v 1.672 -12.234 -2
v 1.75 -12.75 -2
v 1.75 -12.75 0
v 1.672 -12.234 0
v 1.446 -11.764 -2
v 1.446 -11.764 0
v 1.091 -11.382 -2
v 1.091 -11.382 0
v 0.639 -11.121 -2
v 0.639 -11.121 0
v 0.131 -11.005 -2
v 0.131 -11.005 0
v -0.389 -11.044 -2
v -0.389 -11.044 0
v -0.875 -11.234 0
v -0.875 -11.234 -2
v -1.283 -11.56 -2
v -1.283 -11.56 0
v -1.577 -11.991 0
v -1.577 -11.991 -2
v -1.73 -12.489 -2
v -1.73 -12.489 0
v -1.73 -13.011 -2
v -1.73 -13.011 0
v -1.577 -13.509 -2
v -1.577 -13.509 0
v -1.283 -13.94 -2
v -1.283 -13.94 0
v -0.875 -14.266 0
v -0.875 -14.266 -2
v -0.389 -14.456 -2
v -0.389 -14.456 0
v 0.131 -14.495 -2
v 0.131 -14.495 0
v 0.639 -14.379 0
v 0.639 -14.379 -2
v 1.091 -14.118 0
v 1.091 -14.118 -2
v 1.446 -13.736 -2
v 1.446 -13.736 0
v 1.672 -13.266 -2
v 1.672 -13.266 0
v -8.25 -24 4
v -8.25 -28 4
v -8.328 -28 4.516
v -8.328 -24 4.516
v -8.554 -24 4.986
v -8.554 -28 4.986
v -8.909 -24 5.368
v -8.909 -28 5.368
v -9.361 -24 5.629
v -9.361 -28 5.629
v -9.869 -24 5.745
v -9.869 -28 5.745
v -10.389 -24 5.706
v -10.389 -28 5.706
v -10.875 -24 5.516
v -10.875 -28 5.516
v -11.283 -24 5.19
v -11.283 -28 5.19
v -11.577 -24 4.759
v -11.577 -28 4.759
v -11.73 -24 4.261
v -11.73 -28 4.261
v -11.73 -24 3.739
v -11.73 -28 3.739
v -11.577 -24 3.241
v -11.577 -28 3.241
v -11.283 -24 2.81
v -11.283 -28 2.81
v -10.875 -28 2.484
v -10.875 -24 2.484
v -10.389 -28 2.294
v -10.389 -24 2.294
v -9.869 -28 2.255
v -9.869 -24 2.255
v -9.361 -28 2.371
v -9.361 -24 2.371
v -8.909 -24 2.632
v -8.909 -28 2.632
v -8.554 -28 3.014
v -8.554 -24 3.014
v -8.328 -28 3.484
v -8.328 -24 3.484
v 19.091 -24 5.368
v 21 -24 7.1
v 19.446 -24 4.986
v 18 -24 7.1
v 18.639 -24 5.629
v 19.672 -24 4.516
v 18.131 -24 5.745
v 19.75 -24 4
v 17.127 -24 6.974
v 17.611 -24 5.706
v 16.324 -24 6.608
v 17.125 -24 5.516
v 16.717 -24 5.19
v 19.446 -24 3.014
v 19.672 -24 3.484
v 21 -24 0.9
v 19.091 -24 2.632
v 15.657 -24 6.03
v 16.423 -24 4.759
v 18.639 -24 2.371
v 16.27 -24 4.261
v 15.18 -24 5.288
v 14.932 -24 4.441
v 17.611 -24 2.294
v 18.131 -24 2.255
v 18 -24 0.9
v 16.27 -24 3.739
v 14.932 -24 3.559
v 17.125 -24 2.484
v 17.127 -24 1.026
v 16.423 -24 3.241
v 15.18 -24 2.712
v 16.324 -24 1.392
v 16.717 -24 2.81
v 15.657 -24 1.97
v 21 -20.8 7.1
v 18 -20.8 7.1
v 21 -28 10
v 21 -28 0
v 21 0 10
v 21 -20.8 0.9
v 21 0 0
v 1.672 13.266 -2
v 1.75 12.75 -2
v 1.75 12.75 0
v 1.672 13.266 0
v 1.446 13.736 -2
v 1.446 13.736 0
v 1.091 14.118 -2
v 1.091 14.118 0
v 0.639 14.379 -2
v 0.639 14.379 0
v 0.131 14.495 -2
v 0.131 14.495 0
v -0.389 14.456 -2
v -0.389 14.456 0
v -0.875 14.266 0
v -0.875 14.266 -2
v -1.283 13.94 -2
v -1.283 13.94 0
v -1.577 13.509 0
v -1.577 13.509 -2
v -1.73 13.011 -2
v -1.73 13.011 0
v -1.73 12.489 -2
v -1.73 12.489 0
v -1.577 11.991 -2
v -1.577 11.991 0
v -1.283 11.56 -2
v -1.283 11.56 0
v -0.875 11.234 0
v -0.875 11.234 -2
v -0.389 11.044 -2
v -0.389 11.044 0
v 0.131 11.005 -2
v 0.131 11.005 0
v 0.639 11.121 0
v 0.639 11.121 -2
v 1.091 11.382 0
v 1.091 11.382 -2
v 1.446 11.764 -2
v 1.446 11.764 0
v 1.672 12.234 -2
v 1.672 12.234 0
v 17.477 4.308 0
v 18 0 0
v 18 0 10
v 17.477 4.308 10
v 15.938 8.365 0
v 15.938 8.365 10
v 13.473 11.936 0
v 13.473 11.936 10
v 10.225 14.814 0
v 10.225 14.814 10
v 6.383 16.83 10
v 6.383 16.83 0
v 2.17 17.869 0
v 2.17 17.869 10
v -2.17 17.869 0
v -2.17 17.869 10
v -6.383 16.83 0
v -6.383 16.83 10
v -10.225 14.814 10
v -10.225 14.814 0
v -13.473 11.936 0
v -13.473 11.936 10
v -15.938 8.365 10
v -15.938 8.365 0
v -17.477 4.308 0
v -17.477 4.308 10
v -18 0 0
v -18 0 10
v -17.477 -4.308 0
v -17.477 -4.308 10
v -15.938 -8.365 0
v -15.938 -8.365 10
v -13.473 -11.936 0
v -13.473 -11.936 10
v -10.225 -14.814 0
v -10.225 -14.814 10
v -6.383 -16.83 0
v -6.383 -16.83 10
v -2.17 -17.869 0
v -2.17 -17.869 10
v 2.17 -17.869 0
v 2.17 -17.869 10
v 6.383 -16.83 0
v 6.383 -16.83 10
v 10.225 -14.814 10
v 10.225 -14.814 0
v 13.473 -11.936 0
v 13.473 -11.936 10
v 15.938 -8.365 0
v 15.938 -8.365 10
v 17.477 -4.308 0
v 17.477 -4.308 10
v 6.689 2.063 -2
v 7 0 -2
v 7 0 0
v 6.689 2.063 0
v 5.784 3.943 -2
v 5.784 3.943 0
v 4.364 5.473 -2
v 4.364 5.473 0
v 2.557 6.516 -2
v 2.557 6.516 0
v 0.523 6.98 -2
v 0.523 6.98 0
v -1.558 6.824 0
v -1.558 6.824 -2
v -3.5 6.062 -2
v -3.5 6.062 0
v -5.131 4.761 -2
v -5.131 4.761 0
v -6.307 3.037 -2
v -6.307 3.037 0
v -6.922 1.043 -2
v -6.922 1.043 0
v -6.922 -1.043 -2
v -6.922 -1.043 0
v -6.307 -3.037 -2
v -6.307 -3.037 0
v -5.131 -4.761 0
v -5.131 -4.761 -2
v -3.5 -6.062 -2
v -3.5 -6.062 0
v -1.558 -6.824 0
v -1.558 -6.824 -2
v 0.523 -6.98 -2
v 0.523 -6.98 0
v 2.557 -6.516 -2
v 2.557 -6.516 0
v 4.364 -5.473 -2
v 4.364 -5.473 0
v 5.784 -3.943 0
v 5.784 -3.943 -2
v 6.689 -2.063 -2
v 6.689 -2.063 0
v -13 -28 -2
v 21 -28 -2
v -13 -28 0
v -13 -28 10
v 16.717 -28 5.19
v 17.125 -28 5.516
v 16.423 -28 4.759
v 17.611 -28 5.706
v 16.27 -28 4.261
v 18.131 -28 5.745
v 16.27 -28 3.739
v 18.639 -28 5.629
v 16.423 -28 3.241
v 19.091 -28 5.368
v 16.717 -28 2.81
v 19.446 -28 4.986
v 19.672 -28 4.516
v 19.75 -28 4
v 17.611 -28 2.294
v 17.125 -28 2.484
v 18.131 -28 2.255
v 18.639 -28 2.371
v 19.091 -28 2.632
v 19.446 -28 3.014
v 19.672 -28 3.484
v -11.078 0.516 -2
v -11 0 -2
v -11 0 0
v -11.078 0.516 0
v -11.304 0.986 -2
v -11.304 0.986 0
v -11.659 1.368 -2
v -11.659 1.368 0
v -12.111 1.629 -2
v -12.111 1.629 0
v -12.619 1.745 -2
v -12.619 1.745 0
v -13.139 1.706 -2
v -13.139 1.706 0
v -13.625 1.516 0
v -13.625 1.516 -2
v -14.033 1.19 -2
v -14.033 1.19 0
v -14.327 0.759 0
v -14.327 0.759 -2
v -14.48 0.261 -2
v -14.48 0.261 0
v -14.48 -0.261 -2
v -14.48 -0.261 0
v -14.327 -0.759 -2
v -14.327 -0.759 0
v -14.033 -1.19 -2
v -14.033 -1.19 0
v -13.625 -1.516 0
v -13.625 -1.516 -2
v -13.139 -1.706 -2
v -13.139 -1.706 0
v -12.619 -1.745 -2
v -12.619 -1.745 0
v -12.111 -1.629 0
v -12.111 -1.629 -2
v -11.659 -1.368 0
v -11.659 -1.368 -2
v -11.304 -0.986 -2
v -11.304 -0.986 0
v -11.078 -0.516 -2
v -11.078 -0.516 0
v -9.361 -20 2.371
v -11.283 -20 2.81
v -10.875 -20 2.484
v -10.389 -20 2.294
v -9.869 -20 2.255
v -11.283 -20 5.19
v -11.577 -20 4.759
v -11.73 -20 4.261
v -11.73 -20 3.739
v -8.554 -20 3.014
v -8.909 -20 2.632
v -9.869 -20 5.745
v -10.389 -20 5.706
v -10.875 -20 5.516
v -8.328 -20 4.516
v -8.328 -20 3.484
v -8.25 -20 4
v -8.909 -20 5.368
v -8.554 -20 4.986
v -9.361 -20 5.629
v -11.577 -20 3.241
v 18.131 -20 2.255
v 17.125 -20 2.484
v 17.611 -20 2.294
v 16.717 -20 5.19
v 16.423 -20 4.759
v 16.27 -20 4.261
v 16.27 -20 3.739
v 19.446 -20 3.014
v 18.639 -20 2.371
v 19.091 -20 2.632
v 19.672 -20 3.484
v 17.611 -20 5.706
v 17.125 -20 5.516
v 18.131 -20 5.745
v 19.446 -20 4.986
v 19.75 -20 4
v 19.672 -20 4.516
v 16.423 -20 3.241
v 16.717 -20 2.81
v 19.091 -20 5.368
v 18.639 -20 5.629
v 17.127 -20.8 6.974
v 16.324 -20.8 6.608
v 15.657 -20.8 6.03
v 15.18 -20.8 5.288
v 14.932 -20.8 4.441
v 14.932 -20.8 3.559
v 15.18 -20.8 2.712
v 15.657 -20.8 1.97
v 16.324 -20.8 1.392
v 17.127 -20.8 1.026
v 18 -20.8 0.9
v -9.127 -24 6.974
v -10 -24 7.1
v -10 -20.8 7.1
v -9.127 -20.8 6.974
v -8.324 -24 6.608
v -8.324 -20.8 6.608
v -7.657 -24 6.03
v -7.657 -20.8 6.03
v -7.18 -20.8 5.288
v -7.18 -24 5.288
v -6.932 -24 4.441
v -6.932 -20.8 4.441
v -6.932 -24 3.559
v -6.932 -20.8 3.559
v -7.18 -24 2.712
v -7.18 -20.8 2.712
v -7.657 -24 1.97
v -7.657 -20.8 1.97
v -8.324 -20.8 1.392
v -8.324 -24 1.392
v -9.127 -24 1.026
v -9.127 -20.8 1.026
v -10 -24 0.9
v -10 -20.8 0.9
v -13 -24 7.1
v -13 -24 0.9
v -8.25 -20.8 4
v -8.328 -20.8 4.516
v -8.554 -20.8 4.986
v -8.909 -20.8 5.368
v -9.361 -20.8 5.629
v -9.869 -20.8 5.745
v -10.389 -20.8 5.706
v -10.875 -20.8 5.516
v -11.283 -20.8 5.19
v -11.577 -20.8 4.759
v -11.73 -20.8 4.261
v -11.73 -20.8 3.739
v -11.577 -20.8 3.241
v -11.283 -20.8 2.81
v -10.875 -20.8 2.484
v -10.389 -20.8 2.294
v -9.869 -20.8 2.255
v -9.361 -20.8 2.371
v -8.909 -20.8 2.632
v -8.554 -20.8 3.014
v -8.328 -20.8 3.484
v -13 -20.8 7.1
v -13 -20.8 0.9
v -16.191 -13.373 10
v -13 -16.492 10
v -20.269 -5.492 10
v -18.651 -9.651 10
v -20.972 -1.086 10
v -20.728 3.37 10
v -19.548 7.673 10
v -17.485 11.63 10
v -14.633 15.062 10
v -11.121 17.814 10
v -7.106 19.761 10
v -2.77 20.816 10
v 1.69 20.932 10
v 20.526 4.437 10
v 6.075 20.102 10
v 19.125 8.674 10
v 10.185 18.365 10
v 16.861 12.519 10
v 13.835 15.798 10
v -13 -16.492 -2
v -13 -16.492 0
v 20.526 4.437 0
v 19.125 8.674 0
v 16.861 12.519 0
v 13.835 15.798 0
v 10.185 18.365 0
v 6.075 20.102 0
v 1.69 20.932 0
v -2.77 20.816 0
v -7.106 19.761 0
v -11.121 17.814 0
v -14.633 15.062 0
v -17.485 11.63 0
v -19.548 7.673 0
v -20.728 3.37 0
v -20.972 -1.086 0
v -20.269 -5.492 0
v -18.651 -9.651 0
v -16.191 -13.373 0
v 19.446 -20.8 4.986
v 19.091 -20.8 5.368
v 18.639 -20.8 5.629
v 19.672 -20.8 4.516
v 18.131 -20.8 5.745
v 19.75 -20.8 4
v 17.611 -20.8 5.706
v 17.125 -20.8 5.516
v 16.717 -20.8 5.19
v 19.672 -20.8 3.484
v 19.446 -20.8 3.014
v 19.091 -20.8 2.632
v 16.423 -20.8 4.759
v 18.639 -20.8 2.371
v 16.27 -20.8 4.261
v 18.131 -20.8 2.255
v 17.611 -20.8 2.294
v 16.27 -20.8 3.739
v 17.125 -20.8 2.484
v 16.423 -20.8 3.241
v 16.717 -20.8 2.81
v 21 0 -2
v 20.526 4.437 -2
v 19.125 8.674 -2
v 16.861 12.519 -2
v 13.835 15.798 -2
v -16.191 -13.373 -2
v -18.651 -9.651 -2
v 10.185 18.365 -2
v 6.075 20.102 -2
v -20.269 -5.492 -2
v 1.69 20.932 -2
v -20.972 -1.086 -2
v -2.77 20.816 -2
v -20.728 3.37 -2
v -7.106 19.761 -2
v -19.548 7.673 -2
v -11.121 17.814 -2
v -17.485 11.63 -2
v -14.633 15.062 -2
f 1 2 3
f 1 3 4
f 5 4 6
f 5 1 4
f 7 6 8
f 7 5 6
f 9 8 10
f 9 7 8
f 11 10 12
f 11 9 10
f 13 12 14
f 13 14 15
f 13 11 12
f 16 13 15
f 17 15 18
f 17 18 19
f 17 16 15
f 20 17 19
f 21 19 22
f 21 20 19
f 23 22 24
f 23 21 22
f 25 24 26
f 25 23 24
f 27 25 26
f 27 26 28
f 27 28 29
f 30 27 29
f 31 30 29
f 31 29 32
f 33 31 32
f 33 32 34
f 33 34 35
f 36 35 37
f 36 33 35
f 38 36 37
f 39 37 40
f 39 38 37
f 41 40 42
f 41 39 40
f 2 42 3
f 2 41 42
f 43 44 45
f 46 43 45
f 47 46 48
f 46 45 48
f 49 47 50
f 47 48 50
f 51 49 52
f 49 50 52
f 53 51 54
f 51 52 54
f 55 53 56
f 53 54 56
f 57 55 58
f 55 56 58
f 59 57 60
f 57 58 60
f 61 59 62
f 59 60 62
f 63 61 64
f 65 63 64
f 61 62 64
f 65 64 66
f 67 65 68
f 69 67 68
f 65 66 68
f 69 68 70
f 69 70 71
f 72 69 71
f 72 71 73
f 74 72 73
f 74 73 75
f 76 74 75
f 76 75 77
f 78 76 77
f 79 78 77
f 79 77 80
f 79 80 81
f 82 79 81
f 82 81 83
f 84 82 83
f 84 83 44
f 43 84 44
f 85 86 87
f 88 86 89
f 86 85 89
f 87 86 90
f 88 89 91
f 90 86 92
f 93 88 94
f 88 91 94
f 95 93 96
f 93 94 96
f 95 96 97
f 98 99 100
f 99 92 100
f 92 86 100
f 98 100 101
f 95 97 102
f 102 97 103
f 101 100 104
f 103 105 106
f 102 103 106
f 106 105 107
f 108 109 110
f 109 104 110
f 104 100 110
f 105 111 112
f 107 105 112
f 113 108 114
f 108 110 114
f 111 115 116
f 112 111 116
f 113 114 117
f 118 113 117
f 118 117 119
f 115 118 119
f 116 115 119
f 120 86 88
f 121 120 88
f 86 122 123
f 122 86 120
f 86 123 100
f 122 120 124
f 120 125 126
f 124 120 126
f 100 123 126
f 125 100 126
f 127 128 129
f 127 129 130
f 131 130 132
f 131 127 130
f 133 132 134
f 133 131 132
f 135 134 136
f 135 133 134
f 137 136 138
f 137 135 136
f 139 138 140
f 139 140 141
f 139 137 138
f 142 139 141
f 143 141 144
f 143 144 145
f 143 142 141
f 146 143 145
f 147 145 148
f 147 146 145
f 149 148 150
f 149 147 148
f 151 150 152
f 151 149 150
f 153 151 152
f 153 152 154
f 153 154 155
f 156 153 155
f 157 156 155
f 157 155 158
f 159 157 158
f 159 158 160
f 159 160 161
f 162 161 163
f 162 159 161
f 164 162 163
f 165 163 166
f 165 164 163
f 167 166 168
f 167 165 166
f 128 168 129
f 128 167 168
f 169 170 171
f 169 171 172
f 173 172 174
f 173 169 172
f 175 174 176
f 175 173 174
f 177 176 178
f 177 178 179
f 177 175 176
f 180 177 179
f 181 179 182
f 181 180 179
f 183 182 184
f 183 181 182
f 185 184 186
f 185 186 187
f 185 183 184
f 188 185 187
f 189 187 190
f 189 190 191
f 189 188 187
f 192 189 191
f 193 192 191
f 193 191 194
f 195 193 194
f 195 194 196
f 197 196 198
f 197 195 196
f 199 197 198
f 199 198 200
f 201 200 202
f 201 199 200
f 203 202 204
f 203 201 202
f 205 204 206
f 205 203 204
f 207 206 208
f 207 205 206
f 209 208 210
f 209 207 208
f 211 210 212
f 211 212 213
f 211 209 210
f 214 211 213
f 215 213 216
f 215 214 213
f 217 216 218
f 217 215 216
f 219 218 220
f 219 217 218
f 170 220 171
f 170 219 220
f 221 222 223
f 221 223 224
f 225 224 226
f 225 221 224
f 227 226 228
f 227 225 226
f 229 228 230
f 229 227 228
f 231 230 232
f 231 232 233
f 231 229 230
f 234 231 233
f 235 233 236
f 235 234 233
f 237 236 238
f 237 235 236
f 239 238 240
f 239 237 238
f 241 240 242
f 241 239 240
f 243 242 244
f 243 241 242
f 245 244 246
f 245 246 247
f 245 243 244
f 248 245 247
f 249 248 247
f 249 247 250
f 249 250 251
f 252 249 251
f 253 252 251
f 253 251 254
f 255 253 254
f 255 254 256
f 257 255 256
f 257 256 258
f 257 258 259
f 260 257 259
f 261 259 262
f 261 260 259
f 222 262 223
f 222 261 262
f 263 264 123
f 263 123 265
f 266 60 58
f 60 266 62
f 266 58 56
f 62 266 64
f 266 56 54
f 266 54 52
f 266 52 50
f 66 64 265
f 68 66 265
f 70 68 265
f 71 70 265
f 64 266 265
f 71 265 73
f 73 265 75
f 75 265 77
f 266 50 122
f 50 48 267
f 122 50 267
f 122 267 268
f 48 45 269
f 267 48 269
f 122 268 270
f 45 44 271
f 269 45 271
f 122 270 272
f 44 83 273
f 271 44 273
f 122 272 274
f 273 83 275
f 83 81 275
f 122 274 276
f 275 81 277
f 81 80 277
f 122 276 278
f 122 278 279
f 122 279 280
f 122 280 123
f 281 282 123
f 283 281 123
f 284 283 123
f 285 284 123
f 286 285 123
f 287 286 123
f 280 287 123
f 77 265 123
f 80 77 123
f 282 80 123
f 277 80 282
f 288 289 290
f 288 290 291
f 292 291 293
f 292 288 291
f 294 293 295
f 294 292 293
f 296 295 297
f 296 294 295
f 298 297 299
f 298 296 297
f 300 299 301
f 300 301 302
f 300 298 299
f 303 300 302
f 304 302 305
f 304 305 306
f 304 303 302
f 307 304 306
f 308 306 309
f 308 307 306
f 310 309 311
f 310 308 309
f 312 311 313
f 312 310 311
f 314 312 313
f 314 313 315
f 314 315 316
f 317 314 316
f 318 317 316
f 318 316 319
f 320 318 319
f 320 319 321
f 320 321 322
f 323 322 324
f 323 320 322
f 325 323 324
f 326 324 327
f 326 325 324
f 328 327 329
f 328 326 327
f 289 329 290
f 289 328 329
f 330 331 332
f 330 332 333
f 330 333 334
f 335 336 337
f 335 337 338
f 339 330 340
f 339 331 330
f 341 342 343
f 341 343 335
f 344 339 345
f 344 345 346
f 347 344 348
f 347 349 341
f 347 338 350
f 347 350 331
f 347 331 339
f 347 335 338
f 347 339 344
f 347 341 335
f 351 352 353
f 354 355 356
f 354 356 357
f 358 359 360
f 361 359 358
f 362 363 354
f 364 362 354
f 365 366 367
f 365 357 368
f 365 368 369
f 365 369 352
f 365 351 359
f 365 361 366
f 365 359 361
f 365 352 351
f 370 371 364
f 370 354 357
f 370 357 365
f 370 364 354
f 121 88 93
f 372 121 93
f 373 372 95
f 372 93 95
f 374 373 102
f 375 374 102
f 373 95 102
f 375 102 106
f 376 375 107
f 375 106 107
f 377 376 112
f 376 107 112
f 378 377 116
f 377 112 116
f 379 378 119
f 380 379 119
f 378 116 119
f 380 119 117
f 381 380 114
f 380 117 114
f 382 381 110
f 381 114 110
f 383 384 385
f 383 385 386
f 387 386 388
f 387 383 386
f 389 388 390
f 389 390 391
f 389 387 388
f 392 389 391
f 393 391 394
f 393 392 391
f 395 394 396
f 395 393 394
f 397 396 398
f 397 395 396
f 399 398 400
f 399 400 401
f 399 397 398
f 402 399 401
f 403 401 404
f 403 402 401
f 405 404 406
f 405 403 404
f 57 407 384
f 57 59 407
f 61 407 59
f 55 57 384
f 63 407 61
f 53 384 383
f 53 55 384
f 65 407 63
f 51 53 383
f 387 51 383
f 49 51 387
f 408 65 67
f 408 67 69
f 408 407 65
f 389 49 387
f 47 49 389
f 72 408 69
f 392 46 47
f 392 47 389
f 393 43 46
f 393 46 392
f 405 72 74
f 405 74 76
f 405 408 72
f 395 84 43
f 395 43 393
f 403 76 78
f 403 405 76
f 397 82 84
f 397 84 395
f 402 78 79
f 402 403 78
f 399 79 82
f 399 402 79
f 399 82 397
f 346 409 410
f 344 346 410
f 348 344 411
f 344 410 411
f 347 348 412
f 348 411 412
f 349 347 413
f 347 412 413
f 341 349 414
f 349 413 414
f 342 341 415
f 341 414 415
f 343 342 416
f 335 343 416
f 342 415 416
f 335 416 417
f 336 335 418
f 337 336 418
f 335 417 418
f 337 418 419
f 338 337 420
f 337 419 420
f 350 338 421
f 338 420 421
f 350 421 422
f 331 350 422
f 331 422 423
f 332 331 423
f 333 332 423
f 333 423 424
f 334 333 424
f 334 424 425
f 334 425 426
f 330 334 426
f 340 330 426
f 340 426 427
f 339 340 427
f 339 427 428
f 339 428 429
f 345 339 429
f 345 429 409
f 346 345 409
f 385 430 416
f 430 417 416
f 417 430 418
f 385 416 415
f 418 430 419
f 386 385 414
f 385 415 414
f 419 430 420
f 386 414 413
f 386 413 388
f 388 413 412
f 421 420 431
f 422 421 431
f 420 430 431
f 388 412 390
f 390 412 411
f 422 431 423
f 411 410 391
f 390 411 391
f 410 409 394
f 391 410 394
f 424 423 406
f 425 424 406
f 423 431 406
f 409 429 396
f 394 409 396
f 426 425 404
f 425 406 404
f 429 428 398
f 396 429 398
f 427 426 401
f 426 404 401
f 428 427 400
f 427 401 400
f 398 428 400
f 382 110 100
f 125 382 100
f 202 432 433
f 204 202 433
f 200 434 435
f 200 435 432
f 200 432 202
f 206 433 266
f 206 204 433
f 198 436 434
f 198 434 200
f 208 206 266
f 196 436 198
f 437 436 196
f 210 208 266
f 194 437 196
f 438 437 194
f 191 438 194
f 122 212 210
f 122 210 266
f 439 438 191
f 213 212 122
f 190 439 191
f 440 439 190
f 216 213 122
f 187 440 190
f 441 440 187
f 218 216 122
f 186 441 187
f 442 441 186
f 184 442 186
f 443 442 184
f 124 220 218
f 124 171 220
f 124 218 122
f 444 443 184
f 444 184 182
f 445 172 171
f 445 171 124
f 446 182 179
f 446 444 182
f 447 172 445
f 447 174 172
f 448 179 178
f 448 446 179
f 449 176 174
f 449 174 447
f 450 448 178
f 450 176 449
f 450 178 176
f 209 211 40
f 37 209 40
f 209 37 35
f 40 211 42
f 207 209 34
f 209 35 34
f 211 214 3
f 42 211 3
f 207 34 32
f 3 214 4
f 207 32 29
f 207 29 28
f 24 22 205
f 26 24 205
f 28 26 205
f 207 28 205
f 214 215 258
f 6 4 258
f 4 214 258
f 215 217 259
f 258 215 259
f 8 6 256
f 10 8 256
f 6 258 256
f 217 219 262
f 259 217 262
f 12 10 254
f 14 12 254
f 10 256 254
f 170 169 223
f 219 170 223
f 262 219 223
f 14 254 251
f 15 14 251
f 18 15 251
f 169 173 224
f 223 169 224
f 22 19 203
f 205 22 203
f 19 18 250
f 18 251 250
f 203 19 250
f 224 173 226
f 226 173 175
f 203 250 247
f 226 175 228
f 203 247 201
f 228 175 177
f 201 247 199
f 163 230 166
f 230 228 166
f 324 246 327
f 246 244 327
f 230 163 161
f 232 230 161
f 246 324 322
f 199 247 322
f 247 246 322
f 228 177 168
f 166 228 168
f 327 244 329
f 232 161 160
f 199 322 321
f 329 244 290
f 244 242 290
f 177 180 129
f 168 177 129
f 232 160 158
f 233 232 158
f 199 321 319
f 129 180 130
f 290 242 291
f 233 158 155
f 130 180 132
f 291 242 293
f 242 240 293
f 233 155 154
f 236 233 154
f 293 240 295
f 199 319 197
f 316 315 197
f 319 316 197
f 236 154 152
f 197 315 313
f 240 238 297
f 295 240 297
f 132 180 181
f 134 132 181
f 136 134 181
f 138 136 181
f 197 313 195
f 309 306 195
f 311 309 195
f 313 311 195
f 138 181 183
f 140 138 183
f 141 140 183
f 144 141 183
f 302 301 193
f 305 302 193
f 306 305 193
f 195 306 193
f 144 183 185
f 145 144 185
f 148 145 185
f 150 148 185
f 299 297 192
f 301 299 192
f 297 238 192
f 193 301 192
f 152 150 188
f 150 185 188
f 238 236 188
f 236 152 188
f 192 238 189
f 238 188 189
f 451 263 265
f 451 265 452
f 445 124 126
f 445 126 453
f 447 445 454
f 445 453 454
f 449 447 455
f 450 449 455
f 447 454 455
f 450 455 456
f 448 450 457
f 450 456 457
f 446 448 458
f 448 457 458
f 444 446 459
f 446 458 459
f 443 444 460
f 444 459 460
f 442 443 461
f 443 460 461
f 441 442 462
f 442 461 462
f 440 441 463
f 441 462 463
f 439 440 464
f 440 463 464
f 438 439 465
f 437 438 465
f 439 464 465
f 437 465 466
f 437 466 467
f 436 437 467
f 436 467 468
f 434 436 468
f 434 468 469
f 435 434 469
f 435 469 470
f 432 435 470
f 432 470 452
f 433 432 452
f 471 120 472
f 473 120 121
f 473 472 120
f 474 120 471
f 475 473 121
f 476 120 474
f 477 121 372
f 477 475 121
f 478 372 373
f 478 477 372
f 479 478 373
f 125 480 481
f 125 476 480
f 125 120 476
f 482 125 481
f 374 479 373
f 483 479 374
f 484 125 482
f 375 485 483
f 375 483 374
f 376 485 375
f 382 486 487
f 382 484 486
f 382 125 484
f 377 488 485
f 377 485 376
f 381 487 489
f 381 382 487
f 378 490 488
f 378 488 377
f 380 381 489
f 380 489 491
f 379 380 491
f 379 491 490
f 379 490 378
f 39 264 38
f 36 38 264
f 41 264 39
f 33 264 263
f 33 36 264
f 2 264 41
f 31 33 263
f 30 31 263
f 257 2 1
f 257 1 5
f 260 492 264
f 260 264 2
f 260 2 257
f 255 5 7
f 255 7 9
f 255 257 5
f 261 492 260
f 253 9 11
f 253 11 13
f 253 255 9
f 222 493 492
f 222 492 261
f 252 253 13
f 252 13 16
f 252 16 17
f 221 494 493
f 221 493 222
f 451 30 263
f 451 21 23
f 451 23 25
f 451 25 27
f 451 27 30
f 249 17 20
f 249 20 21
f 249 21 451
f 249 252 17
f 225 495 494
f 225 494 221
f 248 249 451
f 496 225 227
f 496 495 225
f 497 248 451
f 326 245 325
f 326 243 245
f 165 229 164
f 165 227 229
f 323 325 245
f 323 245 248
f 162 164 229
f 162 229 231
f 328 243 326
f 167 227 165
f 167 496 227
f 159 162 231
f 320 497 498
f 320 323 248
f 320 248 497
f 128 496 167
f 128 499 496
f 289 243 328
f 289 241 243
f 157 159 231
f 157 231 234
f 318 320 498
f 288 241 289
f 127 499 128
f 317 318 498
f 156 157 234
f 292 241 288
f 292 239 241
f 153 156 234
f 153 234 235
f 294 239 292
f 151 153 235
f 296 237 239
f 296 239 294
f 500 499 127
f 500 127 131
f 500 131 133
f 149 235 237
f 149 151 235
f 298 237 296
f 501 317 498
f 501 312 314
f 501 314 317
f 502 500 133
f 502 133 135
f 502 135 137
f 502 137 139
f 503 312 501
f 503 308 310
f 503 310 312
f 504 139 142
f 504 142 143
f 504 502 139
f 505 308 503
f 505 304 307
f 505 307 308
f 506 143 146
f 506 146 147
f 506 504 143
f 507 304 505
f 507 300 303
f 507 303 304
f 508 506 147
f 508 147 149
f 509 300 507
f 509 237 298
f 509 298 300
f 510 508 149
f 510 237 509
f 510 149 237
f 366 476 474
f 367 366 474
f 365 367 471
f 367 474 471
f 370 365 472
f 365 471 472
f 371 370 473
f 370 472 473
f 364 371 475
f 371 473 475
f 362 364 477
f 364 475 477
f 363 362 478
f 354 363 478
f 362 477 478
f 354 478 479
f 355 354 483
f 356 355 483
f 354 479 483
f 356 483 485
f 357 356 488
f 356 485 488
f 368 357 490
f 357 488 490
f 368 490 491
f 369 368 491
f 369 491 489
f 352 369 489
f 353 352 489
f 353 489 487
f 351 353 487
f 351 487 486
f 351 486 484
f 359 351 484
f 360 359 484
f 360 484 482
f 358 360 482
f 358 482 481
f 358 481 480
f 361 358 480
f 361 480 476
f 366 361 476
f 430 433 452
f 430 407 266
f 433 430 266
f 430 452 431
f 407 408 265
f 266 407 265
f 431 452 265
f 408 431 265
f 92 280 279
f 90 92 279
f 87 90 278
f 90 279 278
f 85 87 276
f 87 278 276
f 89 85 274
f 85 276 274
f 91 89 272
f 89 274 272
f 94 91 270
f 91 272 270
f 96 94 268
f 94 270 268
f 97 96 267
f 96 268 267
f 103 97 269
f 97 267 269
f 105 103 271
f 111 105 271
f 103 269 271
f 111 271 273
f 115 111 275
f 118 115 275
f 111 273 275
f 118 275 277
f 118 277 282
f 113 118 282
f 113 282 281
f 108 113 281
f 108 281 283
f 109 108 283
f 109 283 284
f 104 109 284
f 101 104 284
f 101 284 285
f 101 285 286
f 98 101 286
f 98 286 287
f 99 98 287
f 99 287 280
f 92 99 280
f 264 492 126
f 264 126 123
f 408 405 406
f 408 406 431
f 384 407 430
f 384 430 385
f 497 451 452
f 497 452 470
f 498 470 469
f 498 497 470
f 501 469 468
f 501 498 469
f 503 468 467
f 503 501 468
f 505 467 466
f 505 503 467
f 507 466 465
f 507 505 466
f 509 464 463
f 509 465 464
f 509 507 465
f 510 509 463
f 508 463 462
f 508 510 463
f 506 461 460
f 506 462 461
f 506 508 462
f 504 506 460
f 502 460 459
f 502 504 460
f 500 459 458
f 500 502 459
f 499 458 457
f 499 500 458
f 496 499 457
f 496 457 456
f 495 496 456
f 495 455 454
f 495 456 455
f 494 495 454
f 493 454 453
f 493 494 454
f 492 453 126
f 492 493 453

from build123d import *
from build123d.topology import SkipClean

# Parameters (mm, degrees)
CROQUIS1_R              = 18
SALIENTE_EXTRUIR1_DEPTH = 10
SALIENTE_EXTRUIR2_START = -12
CROQUIS2_R              = 7
CROQUIS2_R_2            = 1.75
SALIENTE_EXTRUIR2_DEPTH = 2
CROQUIS7_R              = 1.75
CORTAR_EXTRUIR3_DEPTH   = 8
CORTAR_EXTRUIR4_DEPTH   = 3.2


with BuildPart() as part:
    # Croquis1 → Saliente-Extruir1 (new body)
    with BuildSketch(Plane.XY):
        with BuildLine():
            Line((-13, -28), (21, -28))
            Line((21, -28), (21, 0))
            ThreePointArc((21, 0), (-9.16515139, 18.894443628), (-13, -16.492422502))
            Line((-13, -16.492422502), (-13, -28))
        make_face()
        Circle(CROQUIS1_R, mode=Mode.SUBTRACT)
    extrude(amount=SALIENTE_EXTRUIR1_DEPTH)

    # Croquis2 → Saliente-Extruir2 (add)
    with SkipClean():  # the faces are left unmerged after this step: merging them gives an invalid solid
        with BuildSketch(Plane.XY.offset(10).offset(SALIENTE_EXTRUIR2_START)):
            with BuildLine():
                Line((21, 0), (21, -28))
                Line((21, -28), (-13, -28))
                Line((-13, -28), (-13, -16.492422502))
                ThreePointArc((-13, -16.492422502), (-9.16515139, 18.894443628), (21, 0))
            make_face()
            Circle(CROQUIS2_R, mode=Mode.SUBTRACT)
            with Locations((0, -12.75)):
                Circle(CROQUIS2_R_2, mode=Mode.SUBTRACT)
            with Locations((0, 12.75)):
                Circle(CROQUIS2_R_2, mode=Mode.SUBTRACT)
            with Locations((-12.75, 0)):
                Circle(CROQUIS2_R_2, mode=Mode.SUBTRACT)
        extrude(amount=SALIENTE_EXTRUIR2_DEPTH)

    # Croquis7 → Cortar-Extruir3 (cut)
    with SkipClean():  # the faces are left unmerged after this step: merging them gives an invalid solid
        with BuildSketch(Plane.XZ.offset(28)):
            with Locations((-10, 4)):
                Circle(CROQUIS7_R)
            with Locations((18, 4)):
                Circle(CROQUIS7_R)
        extrude(amount=-CORTAR_EXTRUIR3_DEPTH, mode=Mode.SUBTRACT)

    # Croquis8 → Cortar-Extruir4 (cut)
    with SkipClean():  # the faces are left unmerged after this step: merging them gives an invalid solid
        with BuildSketch(Plane(origin=(0, -24, 0), x_dir=(-1, 0, 0), z_dir=(0, -1, 0))):
            with BuildLine():
                Line((-18, -0.9), (-21, -0.9))
                Line((-21, -0.9), (-21, -7.1))
                Line((-21, -7.1), (-18, -7.1))
                ThreePointArc((-18, -7.1), (-14.9, -4), (-18, -0.9))
            make_face()
            with BuildLine():
                Line((10, -0.9), (13, -0.9))
                Line((13, -0.9), (13, -7.1))
                Line((13, -7.1), (10, -7.1))
                ThreePointArc((10, -7.1), (6.9, -4), (10, -0.9))
            make_face()
        extrude(amount=-CORTAR_EXTRUIR4_DEPTH, mode=Mode.SUBTRACT)


solid = part.part
